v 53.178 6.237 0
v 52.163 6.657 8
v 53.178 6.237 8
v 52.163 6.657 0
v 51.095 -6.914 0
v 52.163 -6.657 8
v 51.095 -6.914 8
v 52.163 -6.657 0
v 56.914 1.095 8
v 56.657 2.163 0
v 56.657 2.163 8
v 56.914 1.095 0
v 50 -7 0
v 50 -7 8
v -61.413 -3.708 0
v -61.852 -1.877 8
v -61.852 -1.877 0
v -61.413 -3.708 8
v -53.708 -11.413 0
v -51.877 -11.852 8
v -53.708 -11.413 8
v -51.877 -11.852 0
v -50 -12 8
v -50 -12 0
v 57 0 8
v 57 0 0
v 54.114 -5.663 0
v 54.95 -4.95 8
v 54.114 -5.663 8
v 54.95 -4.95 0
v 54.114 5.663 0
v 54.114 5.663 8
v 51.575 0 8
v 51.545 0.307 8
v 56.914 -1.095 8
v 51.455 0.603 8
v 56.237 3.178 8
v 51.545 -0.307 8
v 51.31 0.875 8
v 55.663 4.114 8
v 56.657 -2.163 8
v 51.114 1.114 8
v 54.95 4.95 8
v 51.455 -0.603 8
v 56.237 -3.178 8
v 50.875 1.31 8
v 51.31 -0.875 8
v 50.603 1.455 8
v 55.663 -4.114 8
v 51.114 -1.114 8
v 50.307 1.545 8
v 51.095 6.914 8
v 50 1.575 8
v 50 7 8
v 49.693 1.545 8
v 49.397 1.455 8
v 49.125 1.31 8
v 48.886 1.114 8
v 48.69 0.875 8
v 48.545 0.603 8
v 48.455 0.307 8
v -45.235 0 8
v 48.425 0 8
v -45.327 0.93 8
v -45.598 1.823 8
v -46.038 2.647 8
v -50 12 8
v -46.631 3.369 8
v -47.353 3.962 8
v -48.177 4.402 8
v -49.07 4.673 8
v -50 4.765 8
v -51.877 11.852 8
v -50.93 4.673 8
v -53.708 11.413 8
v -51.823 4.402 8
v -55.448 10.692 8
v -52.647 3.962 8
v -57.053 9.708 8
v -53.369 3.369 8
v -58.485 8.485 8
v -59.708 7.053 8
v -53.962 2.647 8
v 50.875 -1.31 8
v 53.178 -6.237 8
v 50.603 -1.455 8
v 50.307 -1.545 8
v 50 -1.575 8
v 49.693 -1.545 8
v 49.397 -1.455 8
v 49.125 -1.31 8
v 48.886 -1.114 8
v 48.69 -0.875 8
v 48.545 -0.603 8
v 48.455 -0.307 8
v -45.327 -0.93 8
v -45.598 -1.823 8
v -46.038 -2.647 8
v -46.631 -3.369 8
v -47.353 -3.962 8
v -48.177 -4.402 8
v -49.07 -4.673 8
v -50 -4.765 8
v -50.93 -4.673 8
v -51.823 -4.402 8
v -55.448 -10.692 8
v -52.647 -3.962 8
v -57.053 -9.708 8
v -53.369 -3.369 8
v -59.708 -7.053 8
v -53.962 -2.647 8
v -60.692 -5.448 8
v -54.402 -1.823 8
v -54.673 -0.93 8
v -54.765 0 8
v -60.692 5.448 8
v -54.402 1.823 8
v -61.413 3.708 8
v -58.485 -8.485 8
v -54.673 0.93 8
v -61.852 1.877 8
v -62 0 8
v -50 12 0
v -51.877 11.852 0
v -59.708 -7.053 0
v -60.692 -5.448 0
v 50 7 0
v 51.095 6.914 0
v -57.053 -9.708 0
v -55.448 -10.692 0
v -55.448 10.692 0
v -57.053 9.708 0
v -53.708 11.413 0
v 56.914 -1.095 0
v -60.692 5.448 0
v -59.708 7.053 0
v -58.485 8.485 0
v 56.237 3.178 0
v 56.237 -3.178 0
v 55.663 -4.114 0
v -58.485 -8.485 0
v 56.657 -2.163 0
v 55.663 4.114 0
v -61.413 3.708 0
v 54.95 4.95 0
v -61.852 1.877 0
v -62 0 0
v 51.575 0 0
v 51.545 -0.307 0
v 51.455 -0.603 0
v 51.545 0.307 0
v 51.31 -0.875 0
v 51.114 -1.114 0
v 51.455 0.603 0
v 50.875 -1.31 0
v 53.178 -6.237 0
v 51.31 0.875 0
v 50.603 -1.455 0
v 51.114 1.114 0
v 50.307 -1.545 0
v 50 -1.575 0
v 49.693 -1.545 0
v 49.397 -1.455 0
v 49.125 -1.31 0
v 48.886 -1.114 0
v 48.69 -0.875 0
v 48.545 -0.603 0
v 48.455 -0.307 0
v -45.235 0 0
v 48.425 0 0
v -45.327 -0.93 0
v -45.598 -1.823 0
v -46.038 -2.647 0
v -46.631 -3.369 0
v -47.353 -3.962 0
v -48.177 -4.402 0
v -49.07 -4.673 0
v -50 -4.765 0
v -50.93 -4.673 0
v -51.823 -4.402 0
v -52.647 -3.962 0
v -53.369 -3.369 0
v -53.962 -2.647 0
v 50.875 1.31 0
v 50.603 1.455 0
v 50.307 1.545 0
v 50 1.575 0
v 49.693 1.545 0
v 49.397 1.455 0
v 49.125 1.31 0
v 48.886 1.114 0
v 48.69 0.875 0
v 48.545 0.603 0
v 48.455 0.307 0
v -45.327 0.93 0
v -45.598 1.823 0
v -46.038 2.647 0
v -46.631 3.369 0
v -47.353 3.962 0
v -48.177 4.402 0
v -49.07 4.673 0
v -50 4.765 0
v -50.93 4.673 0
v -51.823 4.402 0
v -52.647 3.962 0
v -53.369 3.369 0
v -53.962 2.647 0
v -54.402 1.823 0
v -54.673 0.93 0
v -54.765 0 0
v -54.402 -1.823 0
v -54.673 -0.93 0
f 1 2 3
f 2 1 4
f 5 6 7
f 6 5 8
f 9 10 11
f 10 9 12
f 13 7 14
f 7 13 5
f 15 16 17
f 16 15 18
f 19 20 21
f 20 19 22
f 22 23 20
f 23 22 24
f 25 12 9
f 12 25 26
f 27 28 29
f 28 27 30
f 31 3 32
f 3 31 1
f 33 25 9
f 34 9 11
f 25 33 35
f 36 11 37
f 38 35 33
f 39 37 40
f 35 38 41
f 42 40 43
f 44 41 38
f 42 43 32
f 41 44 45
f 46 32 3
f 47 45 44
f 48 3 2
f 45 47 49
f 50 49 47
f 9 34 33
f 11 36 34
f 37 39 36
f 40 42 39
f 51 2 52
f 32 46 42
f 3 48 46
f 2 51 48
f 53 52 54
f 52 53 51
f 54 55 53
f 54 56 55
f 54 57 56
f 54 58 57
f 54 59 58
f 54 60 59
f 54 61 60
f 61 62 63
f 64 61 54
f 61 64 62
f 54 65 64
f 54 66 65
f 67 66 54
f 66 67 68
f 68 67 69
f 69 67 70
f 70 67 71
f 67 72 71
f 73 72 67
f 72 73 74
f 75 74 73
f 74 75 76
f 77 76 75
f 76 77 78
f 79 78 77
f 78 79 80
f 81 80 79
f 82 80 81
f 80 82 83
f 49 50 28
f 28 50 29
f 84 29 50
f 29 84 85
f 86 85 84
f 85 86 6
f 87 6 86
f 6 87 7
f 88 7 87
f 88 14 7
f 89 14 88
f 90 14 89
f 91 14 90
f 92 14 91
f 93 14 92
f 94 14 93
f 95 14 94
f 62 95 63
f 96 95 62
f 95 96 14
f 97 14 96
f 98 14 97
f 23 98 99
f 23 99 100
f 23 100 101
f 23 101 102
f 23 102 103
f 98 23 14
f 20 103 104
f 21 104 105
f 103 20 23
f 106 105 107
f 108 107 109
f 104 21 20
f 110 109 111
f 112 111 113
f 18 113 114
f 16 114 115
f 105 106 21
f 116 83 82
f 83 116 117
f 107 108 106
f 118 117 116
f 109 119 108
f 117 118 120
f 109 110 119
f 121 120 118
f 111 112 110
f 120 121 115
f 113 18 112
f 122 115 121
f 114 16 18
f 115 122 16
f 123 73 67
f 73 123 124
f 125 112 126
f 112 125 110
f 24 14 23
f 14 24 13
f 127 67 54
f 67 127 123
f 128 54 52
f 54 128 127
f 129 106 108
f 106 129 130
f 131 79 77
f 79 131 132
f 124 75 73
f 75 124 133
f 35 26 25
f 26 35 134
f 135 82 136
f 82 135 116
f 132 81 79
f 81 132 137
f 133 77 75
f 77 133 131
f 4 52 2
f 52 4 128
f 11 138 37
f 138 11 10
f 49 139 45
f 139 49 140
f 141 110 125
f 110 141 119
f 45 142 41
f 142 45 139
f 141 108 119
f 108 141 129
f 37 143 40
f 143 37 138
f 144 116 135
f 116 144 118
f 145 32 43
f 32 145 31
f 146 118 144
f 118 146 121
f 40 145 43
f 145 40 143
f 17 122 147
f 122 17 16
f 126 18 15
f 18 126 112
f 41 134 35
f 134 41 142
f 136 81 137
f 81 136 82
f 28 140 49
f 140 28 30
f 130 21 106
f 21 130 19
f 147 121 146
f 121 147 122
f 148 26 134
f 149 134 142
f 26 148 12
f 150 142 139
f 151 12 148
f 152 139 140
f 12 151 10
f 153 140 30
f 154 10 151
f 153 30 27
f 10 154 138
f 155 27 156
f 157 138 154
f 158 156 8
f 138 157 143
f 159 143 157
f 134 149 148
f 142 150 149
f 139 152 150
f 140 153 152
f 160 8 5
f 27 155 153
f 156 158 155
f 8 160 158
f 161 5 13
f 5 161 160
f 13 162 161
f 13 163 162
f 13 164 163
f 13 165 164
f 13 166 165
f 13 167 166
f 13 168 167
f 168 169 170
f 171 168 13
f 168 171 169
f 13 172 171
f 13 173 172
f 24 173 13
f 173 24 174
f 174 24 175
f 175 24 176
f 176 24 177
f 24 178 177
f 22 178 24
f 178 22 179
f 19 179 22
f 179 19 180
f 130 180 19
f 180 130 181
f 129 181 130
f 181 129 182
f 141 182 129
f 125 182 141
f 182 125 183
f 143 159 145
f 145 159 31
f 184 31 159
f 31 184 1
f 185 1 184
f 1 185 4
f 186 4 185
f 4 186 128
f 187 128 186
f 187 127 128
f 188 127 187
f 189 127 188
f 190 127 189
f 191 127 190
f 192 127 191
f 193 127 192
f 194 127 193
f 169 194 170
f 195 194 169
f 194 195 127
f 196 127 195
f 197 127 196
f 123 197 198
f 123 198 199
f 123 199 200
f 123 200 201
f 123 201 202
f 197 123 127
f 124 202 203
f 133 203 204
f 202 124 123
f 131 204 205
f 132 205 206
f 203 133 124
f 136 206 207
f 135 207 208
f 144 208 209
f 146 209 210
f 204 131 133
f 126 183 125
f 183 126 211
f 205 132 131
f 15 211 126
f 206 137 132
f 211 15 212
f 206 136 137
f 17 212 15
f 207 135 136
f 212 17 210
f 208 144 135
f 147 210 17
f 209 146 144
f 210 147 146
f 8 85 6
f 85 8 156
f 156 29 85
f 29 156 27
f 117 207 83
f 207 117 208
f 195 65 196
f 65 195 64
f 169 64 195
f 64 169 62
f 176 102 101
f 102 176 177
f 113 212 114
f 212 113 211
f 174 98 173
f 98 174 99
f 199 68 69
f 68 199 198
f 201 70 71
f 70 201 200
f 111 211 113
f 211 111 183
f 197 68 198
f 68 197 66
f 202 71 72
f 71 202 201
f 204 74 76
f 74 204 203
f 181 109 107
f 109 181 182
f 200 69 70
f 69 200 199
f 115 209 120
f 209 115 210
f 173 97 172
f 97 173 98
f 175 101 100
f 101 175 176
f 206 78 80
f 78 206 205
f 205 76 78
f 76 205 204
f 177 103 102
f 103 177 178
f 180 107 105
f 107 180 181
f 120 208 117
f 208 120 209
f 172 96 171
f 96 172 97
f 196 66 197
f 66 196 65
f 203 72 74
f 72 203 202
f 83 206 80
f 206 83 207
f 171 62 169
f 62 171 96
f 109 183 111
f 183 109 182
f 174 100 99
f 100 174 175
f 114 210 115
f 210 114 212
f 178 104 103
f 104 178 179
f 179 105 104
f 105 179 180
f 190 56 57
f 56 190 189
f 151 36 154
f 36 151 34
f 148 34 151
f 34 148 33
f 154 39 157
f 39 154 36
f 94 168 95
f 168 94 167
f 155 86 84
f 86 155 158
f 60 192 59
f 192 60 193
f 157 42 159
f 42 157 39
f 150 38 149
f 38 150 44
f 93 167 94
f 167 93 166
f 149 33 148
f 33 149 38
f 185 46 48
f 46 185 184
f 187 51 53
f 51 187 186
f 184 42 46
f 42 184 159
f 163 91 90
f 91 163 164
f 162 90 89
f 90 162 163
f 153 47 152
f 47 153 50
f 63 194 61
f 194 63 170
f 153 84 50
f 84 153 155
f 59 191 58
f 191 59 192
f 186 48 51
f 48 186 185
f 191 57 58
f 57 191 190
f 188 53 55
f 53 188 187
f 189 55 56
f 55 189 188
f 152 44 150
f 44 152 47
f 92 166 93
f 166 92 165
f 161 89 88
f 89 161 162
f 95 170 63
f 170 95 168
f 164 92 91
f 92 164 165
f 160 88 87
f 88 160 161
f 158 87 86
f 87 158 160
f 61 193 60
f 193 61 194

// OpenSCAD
$fn = 32;

// ----------------------------------------------------------------------
// Lever: 100 mm between the bosses, 8 mm thick, smooth outline
// ----------------------------------------------------------------------

// --- parameters (mm) ---
lever_l = 100;            // distance between the boss centres
boss_a = 24;              // first boss diameter
boss_b = 14;              // second boss diameter
bore_a = 9.53;            // first bore
bore_b = 3.15;            // second bore
lever_t = 8;              // lever thickness

lever_profile = [[-62, 0], [-61.852, -1.877], [-61.413, -3.708], [-60.692, -5.448], [-59.708, -7.053], [-58.485, -8.485], [-57.053, -9.708], [-55.448, -10.692], [-53.708, -11.413], [-51.877, -11.852], [-50, -12], [50, -7], [51.095, -6.914], [52.163, -6.657], [53.178, -6.237], [54.114, -5.663], [54.95, -4.95], [55.663, -4.114], [56.237, -3.178], [56.657, -2.163], [56.914, -1.095], [57, 0], [56.914, 1.095], [56.657, 2.163], [56.237, 3.178], [55.663, 4.114], [54.95, 4.95], [54.114, 5.663], [53.178, 6.237], [52.163, 6.657], [51.095, 6.914], [50, 7], [-50, 12], [-51.877, 11.852], [-53.708, 11.413], [-55.448, 10.692], [-57.053, 9.708], [-58.485, 8.485], [-59.708, 7.053], [-60.692, 5.448], [-61.413, 3.708], [-61.852, 1.877]];

difference() {
  linear_extrude(height = lever_t) polygon(lever_profile);
  translate([-50, 0, -2.5]) cylinder(h = lever_t + 5, d = bore_a);
  translate([50, 0, -2.5]) cylinder(h = lever_t + 5, d = bore_b);
}
